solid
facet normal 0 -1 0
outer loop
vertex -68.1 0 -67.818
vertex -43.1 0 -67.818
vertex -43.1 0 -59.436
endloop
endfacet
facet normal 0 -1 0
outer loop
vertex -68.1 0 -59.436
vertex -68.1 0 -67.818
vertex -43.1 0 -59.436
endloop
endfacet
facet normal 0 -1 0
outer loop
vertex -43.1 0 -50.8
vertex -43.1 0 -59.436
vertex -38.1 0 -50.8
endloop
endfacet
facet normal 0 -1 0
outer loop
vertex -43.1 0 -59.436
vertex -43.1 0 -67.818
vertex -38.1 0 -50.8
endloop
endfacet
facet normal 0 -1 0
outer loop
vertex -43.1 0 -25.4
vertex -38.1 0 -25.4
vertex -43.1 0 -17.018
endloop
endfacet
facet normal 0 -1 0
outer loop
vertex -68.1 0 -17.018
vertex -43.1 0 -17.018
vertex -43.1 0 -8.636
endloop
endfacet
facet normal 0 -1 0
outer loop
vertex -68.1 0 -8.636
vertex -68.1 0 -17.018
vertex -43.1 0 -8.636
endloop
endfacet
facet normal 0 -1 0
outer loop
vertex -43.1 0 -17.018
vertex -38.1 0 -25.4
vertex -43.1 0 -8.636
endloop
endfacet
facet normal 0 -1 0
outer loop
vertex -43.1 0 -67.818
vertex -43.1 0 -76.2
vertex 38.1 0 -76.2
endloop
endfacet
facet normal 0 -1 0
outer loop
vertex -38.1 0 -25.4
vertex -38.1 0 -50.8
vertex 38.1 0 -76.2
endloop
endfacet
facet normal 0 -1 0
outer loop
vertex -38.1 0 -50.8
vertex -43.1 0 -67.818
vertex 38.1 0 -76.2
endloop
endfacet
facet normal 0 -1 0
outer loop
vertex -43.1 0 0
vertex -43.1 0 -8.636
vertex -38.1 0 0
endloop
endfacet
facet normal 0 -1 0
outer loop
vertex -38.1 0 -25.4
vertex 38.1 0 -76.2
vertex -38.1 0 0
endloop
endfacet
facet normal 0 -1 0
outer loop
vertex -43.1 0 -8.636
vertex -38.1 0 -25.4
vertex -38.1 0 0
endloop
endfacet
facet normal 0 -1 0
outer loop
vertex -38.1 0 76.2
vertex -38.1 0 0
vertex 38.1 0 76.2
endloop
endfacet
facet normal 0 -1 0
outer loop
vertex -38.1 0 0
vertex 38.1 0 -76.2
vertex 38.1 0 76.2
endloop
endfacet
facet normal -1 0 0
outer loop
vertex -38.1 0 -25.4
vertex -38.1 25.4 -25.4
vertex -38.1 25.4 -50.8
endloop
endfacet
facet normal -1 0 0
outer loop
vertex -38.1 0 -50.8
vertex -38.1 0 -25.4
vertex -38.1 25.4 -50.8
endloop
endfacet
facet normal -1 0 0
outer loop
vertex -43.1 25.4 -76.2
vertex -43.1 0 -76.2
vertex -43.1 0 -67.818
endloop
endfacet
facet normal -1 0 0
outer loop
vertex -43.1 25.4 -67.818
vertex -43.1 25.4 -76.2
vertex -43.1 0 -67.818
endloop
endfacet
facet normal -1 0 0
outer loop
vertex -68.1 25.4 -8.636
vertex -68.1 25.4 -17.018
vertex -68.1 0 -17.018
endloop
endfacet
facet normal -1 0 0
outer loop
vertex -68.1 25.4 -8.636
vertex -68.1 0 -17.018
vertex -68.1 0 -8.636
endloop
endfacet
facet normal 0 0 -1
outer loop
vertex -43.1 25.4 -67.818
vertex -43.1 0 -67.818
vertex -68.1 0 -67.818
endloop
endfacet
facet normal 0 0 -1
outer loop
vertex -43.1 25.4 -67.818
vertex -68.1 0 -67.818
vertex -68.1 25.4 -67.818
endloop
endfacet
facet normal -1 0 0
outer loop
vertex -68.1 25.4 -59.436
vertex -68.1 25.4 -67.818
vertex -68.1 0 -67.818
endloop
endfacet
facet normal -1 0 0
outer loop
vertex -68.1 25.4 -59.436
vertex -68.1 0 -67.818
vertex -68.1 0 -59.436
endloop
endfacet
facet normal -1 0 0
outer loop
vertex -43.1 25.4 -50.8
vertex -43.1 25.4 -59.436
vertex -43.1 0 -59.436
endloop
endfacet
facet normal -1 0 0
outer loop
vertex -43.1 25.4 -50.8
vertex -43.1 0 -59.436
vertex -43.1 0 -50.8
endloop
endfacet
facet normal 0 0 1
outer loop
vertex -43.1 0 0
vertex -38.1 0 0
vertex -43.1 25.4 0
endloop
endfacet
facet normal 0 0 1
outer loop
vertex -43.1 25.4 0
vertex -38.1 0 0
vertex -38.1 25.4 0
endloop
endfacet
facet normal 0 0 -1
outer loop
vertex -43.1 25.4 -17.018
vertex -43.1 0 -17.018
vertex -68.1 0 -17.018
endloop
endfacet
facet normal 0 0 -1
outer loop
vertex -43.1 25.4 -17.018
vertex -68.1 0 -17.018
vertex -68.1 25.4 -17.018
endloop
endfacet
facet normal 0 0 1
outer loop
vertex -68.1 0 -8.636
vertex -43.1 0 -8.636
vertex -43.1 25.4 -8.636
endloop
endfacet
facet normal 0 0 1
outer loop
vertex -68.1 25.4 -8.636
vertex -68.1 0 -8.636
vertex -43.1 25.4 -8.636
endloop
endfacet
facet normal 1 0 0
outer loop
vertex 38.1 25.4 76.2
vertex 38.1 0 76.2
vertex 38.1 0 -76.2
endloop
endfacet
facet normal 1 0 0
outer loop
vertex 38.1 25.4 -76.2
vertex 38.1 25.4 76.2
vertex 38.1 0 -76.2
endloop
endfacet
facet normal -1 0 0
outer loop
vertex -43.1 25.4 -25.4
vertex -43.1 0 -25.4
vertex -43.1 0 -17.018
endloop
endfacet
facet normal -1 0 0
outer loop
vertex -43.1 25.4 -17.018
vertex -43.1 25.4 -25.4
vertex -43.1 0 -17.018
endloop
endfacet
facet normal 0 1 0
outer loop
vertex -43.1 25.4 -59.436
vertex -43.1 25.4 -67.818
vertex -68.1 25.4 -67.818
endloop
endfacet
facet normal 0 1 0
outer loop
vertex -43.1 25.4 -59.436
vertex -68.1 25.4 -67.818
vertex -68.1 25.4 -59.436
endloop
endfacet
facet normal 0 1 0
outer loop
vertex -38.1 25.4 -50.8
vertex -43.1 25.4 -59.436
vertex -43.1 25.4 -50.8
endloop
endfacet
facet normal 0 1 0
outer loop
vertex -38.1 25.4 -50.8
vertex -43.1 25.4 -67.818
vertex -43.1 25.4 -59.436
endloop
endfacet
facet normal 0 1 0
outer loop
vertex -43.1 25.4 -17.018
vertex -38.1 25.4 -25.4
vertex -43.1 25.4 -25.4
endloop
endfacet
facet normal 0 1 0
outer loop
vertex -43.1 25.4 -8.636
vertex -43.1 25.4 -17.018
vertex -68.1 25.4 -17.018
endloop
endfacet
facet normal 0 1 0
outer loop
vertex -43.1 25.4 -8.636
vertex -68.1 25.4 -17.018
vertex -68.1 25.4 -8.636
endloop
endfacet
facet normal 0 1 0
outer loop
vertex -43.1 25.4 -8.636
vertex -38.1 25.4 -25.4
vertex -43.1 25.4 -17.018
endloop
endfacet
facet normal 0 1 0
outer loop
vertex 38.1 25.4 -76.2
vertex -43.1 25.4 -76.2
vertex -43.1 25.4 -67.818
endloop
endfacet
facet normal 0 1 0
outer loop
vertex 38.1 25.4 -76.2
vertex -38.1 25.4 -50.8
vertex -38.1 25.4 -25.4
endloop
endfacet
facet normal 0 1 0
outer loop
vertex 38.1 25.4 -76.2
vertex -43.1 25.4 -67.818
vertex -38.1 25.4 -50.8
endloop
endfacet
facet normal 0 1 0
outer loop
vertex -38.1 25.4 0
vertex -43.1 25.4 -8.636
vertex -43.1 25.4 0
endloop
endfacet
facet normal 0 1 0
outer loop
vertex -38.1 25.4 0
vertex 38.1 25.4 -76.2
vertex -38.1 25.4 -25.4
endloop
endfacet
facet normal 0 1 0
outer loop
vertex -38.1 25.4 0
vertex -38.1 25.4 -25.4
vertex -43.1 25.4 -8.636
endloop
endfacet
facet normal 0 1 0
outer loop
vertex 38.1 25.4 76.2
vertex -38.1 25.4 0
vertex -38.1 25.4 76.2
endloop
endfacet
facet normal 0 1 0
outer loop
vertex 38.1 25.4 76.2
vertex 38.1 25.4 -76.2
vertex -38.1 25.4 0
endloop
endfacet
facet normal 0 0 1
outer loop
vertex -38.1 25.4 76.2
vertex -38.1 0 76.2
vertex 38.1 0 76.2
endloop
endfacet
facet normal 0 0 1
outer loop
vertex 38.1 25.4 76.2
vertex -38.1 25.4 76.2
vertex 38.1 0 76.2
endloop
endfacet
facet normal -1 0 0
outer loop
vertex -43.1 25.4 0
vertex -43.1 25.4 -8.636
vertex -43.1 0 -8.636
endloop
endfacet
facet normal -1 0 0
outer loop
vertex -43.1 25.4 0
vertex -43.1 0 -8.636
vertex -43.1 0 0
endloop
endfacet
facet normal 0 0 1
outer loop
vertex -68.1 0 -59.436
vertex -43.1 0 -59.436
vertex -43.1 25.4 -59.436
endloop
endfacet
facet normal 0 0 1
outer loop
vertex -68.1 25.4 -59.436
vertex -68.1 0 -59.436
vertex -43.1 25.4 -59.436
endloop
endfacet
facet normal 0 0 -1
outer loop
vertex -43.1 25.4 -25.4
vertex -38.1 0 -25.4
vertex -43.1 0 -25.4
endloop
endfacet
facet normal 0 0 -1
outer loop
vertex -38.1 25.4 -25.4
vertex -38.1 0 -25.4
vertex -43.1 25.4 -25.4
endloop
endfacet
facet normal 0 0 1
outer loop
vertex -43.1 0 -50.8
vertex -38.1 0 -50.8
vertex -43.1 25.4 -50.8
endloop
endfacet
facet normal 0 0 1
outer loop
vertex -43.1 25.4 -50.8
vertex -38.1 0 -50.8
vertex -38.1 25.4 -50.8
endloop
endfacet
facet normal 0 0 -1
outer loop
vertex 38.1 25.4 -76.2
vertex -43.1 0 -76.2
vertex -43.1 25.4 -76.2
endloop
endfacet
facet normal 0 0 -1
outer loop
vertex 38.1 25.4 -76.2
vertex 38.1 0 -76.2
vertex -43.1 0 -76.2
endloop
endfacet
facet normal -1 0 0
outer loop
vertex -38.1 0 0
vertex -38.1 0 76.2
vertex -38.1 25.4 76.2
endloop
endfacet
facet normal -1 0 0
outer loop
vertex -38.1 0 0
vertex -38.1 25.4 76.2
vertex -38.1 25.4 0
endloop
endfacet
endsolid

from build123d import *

# Parameters (mm, degrees)
SKETCH1_W      = 76.2
SKETCH1_H      = 152.4
EXTRUDE1_DEPTH = 25.4
SKETCH2_W      = 25.4
SKETCH2_H      = 25.4
EXTRUDE2_DEPTH = 5
SKETCH3_W      = 8.382
SKETCH3_H      = 25.4
EXTRUDE3_DEPTH = 25
SKETCH4_W      = 25.4
SKETCH4_H      = 25.4
EXTRUDE4_DEPTH = 5
SKETCH5_W      = 8.382
SKETCH5_H      = 25.4
EXTRUDE5_DEPTH = 25


with BuildPart() as part:
    # Sketch1 → Extrude1 (new body)
    with BuildSketch(Plane(origin=(0, 0, 0), x_dir=(1, 0, 0), z_dir=(0, 1, 0))):
        Rectangle(SKETCH1_W, SKETCH1_H)
    extrude(amount=EXTRUDE1_DEPTH)

    # Sketch2 → Extrude2 (add)
    with BuildSketch(Plane.ZY.offset(38.1)):
        with Locations((-63.5, 12.7)):
            Rectangle(SKETCH2_W, SKETCH2_H)
    extrude(amount=EXTRUDE2_DEPTH)

    # Sketch3 → Extrude3 (add)
    with BuildSketch(Plane.ZY.offset(43.1)):
        with Locations((-63.627, 12.7)):
            Rectangle(SKETCH3_W, SKETCH3_H)
    extrude(amount=EXTRUDE3_DEPTH)

    # Sketch4 → Extrude4 (add)
    with BuildSketch(Plane.ZY.offset(38.1)):
        with Locations((-12.7, 12.7)):
            Rectangle(SKETCH4_W, SKETCH4_H)
    extrude(amount=EXTRUDE4_DEPTH)

    # Sketch5 → Extrude5 (add)
    with BuildSketch(Plane.ZY.offset(43.1)):
        with Locations((-12.827, 12.7)):
            Rectangle(SKETCH5_W, SKETCH5_H)
    extrude(amount=EXTRUDE5_DEPTH)


solid = part.part
